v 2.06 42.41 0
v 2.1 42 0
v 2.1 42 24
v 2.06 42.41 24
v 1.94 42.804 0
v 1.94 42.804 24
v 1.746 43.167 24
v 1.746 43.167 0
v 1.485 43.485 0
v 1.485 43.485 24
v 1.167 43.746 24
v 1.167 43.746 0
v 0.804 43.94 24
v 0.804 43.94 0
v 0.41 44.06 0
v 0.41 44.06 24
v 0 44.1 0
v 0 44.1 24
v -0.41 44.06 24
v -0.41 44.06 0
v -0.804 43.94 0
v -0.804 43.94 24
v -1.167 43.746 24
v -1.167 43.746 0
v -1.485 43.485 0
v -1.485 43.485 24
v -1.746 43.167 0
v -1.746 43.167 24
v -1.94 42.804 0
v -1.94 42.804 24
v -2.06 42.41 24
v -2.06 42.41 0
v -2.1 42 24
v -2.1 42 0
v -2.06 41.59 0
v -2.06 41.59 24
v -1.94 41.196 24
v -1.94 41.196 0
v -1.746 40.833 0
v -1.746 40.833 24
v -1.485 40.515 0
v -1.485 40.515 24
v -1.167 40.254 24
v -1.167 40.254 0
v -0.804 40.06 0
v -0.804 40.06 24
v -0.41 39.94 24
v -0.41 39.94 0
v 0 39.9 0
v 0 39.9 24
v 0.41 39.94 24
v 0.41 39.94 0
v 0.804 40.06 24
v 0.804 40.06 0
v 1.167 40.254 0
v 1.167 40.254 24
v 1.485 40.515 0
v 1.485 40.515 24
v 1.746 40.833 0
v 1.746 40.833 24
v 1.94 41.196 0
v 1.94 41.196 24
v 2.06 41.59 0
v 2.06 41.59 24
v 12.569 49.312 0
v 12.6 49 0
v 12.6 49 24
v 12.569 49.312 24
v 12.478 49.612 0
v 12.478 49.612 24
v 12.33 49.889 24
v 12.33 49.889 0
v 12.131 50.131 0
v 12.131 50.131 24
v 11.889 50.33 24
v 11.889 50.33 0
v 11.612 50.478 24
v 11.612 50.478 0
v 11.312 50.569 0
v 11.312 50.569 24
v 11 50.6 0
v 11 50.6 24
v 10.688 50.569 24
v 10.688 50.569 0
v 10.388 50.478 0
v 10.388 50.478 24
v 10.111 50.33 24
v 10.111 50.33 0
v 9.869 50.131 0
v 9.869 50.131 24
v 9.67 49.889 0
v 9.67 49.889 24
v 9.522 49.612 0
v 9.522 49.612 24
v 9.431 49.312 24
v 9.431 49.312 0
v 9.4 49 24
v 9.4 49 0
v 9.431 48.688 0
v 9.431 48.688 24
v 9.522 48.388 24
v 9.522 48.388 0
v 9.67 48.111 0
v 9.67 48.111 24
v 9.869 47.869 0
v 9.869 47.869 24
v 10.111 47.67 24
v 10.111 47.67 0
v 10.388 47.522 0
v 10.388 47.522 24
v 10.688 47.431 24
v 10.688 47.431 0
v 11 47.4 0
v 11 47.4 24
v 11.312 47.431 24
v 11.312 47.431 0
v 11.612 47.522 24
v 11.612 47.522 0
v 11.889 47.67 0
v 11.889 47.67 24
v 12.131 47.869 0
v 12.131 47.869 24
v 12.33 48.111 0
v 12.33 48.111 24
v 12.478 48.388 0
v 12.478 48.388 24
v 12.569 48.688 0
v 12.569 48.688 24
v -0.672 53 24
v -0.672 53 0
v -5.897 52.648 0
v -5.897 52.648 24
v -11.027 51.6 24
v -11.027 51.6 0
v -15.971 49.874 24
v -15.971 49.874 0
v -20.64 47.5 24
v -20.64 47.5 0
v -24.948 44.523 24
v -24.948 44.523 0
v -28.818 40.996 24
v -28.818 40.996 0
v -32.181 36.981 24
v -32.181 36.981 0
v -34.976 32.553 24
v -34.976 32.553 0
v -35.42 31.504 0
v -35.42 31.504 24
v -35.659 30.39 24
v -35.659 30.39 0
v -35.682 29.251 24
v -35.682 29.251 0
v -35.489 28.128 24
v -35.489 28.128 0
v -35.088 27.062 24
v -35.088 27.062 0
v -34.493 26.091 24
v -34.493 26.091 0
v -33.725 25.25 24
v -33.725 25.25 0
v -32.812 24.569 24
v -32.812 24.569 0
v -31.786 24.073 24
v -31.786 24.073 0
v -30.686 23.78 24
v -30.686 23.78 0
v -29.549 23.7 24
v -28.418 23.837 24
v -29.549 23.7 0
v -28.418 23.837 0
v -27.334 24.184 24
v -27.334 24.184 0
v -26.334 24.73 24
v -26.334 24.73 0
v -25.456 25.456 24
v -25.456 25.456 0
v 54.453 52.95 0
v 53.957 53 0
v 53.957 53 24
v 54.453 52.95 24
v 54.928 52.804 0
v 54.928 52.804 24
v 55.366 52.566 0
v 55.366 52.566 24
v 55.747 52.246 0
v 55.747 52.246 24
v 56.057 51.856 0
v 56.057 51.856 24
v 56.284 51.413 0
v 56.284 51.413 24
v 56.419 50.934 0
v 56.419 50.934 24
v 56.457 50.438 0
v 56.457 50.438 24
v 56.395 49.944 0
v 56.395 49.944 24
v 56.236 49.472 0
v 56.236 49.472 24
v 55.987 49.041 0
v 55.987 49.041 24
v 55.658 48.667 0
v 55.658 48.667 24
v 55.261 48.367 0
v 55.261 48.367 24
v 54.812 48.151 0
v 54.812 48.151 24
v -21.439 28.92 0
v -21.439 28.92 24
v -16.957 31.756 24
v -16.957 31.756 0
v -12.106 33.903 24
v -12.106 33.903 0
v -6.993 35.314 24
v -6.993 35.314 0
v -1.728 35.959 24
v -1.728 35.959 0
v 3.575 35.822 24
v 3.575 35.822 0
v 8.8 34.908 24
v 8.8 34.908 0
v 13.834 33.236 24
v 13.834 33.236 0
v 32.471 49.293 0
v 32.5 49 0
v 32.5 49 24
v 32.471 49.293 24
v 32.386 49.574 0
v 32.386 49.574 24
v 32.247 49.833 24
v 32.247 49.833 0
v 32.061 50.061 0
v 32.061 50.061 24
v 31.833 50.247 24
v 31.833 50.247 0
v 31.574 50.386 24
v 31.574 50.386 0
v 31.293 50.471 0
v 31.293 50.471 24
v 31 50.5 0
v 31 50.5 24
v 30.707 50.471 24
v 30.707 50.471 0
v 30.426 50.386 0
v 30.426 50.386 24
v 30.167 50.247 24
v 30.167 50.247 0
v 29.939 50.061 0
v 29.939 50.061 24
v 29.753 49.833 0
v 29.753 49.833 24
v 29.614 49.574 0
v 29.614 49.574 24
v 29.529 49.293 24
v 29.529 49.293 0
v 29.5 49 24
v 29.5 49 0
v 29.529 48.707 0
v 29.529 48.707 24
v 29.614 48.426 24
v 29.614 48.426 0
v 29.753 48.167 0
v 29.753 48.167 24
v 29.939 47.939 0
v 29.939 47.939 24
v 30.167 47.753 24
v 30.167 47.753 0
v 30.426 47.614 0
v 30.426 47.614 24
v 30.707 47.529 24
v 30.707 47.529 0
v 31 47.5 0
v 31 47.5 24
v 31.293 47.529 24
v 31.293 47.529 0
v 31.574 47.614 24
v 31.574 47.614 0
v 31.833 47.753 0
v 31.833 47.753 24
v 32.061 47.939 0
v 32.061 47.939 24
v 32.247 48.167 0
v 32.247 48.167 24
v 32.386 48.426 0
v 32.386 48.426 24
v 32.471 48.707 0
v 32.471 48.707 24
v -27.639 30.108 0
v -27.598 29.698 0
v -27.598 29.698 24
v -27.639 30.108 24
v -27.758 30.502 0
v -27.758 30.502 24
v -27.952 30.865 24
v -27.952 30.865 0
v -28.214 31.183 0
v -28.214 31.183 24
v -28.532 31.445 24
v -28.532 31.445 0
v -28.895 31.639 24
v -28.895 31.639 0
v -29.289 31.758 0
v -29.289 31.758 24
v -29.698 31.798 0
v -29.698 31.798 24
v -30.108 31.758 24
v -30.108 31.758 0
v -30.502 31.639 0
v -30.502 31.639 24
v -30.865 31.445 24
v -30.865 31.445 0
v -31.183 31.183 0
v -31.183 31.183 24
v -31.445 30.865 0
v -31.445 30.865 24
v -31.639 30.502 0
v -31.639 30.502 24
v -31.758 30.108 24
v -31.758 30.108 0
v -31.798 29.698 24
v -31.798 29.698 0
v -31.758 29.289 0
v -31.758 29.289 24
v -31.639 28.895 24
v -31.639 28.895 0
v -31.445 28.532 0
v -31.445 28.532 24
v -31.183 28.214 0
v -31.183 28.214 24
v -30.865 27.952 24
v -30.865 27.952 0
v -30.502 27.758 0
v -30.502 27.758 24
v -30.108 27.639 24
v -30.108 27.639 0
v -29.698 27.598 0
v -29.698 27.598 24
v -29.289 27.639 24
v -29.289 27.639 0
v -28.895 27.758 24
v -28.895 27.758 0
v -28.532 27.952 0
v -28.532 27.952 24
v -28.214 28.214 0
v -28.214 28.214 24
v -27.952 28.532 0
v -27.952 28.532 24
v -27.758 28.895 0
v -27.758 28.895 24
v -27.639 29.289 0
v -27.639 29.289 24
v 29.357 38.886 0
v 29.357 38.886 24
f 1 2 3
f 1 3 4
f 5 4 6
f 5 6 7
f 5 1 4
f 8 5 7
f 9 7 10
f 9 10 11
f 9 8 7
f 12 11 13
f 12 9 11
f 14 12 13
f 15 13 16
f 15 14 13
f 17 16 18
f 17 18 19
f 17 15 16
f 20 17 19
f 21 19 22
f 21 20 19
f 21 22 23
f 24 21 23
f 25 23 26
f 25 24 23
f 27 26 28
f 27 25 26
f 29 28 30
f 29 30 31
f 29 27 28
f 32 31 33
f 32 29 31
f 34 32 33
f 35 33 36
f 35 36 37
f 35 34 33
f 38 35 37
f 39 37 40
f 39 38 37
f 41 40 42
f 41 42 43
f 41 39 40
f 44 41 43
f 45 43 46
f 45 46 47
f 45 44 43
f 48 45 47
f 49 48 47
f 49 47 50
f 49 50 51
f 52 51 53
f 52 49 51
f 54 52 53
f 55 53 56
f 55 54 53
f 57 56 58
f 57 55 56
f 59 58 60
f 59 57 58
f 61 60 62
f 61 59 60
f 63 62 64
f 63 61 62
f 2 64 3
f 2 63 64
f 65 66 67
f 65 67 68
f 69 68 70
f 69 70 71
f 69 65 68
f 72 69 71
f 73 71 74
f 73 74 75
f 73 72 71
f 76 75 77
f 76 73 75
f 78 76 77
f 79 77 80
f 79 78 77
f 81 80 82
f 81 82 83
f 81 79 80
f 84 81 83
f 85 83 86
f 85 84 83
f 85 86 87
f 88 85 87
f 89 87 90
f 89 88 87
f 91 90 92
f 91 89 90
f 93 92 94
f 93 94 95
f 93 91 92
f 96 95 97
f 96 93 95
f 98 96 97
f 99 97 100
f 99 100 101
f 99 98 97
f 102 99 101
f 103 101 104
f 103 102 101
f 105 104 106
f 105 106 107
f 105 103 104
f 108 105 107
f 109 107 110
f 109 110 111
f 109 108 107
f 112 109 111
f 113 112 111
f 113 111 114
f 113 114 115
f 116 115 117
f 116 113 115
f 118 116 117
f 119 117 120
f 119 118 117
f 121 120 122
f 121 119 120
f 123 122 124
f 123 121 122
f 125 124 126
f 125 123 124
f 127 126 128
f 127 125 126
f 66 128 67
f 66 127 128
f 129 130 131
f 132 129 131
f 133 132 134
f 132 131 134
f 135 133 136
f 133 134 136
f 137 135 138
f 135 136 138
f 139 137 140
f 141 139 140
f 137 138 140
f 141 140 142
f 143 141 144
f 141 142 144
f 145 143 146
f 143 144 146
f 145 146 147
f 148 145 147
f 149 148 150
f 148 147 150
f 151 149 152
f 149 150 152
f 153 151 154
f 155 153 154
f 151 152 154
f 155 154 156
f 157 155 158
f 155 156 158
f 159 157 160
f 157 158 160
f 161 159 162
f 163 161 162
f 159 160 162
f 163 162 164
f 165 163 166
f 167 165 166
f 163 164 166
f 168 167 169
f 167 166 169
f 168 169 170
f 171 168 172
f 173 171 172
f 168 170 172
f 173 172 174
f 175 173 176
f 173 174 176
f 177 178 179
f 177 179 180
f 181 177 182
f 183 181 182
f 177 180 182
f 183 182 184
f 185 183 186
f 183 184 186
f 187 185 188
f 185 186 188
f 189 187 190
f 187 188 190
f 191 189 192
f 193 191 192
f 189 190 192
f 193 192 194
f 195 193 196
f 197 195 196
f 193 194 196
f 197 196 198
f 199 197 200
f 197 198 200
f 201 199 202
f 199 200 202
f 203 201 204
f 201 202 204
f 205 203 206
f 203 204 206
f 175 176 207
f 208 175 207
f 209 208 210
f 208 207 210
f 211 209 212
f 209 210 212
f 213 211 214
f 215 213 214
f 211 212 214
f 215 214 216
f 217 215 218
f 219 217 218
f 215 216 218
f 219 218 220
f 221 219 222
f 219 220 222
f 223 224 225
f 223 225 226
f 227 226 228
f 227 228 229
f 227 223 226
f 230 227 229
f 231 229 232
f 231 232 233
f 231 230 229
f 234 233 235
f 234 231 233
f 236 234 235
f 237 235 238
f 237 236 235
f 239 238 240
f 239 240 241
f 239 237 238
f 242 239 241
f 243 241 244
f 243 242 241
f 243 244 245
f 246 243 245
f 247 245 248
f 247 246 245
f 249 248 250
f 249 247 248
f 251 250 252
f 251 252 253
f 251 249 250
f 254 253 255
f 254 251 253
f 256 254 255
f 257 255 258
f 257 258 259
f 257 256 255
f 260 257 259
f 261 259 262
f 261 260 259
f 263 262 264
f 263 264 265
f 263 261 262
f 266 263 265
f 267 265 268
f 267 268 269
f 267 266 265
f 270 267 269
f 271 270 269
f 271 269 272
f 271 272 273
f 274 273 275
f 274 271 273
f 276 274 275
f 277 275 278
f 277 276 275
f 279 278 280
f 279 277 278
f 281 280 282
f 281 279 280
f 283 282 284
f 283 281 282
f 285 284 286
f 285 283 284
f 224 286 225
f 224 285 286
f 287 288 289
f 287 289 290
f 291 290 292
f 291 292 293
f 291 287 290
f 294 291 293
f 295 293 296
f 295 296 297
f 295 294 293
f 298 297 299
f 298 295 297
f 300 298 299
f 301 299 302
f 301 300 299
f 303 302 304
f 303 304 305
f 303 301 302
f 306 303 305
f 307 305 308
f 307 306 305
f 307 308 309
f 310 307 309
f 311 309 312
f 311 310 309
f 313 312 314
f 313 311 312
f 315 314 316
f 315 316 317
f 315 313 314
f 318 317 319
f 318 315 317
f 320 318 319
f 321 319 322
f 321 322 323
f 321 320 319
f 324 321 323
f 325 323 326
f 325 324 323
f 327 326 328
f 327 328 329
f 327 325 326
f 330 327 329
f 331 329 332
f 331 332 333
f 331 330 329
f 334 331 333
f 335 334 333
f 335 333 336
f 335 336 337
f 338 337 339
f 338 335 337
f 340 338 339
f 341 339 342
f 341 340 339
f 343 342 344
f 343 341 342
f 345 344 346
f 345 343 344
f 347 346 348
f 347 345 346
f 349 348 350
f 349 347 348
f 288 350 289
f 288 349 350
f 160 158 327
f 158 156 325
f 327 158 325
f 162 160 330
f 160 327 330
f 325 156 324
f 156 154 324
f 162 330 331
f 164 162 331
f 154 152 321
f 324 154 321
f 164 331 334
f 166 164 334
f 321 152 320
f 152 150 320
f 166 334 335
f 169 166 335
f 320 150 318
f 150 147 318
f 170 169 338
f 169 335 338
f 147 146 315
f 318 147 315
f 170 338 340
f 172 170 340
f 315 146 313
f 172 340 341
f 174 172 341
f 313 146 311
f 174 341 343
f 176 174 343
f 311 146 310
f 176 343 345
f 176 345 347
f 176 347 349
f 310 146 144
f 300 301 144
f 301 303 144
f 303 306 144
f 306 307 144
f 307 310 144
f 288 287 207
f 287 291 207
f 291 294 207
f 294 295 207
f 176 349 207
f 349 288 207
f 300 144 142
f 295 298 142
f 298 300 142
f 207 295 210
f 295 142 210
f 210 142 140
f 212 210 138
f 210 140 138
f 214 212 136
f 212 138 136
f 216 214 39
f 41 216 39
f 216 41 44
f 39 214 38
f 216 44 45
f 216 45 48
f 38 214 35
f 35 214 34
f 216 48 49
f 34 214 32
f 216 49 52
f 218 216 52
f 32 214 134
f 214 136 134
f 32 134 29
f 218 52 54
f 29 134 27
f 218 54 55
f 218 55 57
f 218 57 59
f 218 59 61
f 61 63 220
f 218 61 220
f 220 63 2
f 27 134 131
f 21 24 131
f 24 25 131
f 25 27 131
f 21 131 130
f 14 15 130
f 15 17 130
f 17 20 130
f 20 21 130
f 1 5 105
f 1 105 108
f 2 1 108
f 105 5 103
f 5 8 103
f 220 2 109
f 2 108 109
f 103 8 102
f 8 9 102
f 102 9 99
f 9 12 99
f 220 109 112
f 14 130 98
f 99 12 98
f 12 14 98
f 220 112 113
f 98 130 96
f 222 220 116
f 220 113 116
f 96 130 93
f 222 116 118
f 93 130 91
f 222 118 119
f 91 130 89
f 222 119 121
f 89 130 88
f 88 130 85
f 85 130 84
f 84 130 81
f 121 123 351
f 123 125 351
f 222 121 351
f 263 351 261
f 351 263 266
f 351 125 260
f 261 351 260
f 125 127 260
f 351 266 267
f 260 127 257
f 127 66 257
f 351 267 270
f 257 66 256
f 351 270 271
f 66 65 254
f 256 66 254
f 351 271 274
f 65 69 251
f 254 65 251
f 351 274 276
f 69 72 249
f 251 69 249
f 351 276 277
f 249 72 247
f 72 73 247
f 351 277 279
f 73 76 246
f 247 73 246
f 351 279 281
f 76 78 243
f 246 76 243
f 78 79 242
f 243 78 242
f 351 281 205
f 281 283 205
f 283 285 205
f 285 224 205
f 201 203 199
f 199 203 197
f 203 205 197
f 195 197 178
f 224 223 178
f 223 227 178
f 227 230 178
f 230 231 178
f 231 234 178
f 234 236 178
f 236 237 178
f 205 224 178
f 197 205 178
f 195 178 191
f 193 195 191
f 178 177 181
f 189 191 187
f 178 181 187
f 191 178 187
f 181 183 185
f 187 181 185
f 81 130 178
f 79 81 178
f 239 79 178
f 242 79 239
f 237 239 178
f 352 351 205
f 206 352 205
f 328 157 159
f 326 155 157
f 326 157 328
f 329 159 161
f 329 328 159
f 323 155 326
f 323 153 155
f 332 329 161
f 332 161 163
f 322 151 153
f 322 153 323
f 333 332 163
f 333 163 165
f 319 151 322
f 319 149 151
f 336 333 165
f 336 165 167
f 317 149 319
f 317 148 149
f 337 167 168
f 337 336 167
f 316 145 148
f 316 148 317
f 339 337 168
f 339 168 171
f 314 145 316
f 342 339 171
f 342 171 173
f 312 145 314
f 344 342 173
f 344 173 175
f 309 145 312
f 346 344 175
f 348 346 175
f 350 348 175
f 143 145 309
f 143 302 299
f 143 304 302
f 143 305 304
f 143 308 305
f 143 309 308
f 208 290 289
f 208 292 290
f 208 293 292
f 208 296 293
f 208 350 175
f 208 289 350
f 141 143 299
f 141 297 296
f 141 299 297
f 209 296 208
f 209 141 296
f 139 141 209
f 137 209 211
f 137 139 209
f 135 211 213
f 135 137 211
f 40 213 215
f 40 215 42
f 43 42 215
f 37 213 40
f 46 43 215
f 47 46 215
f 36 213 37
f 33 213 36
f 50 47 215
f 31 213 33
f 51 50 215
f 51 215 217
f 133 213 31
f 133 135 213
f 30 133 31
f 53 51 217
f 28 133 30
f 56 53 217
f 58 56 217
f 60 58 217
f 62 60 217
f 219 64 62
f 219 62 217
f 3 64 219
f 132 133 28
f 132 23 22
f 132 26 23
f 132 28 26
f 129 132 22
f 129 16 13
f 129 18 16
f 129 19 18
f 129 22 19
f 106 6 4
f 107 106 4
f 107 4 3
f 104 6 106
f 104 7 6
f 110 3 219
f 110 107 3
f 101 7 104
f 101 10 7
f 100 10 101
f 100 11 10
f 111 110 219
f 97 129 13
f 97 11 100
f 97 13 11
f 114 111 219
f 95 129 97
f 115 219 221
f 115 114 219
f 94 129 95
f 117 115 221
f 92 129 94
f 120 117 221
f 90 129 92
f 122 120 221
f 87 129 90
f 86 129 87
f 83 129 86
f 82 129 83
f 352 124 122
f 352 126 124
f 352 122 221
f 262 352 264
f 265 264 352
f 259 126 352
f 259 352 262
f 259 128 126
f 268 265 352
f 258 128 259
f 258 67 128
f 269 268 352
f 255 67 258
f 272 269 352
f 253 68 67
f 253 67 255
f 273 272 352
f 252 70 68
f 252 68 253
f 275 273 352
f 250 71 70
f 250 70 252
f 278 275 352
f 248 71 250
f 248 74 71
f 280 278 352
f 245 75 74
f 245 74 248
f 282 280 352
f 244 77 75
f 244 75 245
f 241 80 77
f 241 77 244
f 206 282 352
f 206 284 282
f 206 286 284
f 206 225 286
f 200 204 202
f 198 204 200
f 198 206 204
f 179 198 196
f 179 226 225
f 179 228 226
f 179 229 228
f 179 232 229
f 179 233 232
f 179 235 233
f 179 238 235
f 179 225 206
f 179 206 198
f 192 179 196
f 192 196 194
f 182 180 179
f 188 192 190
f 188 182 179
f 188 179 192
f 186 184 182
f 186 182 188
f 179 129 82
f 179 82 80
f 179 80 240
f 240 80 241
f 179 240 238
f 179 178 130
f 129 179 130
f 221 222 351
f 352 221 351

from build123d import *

# Parameters (mm, degrees)
SKETCH_1_R          = 2.1
SKETCH_1_R_2        = 6
EXTRUDE_1_DEPTH     = 24
FILLET_1_R          = 2.5
CUT_EXTRUDE_START   = -24
SKETCH_3_R          = 1.6
SKETCH_3_R_2        = 1.5
SKETCH_3_R_3        = 2.1
CUT_EXTRUDE_2_DEPTH = 24


with BuildPart() as part:
    # 草图1 → 凸台-拉伸1 (new body)
    # profile 1 of 3: a face of its own
    with BuildSketch(Plane.XY):
        with BuildLine():
            Line((68.135486627, 53), (-0.671642545, 53))
            ThreePointArc((-0.671642545, 53), (15.918389352, 49.295479077), (29.356722765, 38.885684233))
            Line((29.356722765, 38.885684233), (68.135486627, 53))
        make_face()
    # profile 2 of 3: a face of its own
    with BuildSketch(Plane.XY):
        with BuildLine():
            ThreePointArc((29.356722765, 38.885684233), (15.918389352, 49.295479077), (-0.671642545, 53))
            ThreePointArc((-0.671642545, 53), (-20.639649059, 47.500428563), (-34.976092597, 32.552754602))
            ThreePointArc((-34.976092597, 32.552754602), (-28.226351446, 35.515083761), (-23.69848481, 29.69848481))
            ThreePointArc((-23.69848481, 29.69848481), (-24.155207625, 27.402384191), (-25.45584416, 25.455844085))
            ThreePointArc((-25.45584416, 25.455844085), (-6.992802508, 35.314313148), (13.833943007, 33.235854448))
            Line((13.833943007, 33.235854448), (29.356722765, 38.885684233))
        make_face()
        with Locations((0, 42)):
            Circle(SKETCH_1_R, mode=Mode.SUBTRACT)
    # profile 3 of 3: a face of its own
    with BuildSketch(Plane.XY):
        with Locations((-29.69848481, 29.69848481)):
            Circle(SKETCH_1_R_2)
        with Locations((-29.69848481, 29.69848481)):
            Circle(SKETCH_1_R, mode=Mode.SUBTRACT)
    extrude(amount=EXTRUDE_1_DEPTH)

    # 圆角1
    fillet_1_edges = [part.edges().sort_by_distance(p)[0] for p in [
        (68.135486627, 53, 12),
    ]]
    fillet(fillet_1_edges, radius=FILLET_1_R)

    # 草图3 → 切除-拉伸2 (cut)
    with BuildSketch(Plane.XY.offset(24).offset(CUT_EXTRUDE_START)):
        with Locations((11, 49)):
            Circle(SKETCH_3_R)
        with Locations((31, 49)):
            Circle(SKETCH_3_R_2)
        with Locations((0, 42)):
            Circle(SKETCH_3_R_3)
    extrude(amount=CUT_EXTRUDE_2_DEPTH, mode=Mode.SUBTRACT)


solid = part.part
